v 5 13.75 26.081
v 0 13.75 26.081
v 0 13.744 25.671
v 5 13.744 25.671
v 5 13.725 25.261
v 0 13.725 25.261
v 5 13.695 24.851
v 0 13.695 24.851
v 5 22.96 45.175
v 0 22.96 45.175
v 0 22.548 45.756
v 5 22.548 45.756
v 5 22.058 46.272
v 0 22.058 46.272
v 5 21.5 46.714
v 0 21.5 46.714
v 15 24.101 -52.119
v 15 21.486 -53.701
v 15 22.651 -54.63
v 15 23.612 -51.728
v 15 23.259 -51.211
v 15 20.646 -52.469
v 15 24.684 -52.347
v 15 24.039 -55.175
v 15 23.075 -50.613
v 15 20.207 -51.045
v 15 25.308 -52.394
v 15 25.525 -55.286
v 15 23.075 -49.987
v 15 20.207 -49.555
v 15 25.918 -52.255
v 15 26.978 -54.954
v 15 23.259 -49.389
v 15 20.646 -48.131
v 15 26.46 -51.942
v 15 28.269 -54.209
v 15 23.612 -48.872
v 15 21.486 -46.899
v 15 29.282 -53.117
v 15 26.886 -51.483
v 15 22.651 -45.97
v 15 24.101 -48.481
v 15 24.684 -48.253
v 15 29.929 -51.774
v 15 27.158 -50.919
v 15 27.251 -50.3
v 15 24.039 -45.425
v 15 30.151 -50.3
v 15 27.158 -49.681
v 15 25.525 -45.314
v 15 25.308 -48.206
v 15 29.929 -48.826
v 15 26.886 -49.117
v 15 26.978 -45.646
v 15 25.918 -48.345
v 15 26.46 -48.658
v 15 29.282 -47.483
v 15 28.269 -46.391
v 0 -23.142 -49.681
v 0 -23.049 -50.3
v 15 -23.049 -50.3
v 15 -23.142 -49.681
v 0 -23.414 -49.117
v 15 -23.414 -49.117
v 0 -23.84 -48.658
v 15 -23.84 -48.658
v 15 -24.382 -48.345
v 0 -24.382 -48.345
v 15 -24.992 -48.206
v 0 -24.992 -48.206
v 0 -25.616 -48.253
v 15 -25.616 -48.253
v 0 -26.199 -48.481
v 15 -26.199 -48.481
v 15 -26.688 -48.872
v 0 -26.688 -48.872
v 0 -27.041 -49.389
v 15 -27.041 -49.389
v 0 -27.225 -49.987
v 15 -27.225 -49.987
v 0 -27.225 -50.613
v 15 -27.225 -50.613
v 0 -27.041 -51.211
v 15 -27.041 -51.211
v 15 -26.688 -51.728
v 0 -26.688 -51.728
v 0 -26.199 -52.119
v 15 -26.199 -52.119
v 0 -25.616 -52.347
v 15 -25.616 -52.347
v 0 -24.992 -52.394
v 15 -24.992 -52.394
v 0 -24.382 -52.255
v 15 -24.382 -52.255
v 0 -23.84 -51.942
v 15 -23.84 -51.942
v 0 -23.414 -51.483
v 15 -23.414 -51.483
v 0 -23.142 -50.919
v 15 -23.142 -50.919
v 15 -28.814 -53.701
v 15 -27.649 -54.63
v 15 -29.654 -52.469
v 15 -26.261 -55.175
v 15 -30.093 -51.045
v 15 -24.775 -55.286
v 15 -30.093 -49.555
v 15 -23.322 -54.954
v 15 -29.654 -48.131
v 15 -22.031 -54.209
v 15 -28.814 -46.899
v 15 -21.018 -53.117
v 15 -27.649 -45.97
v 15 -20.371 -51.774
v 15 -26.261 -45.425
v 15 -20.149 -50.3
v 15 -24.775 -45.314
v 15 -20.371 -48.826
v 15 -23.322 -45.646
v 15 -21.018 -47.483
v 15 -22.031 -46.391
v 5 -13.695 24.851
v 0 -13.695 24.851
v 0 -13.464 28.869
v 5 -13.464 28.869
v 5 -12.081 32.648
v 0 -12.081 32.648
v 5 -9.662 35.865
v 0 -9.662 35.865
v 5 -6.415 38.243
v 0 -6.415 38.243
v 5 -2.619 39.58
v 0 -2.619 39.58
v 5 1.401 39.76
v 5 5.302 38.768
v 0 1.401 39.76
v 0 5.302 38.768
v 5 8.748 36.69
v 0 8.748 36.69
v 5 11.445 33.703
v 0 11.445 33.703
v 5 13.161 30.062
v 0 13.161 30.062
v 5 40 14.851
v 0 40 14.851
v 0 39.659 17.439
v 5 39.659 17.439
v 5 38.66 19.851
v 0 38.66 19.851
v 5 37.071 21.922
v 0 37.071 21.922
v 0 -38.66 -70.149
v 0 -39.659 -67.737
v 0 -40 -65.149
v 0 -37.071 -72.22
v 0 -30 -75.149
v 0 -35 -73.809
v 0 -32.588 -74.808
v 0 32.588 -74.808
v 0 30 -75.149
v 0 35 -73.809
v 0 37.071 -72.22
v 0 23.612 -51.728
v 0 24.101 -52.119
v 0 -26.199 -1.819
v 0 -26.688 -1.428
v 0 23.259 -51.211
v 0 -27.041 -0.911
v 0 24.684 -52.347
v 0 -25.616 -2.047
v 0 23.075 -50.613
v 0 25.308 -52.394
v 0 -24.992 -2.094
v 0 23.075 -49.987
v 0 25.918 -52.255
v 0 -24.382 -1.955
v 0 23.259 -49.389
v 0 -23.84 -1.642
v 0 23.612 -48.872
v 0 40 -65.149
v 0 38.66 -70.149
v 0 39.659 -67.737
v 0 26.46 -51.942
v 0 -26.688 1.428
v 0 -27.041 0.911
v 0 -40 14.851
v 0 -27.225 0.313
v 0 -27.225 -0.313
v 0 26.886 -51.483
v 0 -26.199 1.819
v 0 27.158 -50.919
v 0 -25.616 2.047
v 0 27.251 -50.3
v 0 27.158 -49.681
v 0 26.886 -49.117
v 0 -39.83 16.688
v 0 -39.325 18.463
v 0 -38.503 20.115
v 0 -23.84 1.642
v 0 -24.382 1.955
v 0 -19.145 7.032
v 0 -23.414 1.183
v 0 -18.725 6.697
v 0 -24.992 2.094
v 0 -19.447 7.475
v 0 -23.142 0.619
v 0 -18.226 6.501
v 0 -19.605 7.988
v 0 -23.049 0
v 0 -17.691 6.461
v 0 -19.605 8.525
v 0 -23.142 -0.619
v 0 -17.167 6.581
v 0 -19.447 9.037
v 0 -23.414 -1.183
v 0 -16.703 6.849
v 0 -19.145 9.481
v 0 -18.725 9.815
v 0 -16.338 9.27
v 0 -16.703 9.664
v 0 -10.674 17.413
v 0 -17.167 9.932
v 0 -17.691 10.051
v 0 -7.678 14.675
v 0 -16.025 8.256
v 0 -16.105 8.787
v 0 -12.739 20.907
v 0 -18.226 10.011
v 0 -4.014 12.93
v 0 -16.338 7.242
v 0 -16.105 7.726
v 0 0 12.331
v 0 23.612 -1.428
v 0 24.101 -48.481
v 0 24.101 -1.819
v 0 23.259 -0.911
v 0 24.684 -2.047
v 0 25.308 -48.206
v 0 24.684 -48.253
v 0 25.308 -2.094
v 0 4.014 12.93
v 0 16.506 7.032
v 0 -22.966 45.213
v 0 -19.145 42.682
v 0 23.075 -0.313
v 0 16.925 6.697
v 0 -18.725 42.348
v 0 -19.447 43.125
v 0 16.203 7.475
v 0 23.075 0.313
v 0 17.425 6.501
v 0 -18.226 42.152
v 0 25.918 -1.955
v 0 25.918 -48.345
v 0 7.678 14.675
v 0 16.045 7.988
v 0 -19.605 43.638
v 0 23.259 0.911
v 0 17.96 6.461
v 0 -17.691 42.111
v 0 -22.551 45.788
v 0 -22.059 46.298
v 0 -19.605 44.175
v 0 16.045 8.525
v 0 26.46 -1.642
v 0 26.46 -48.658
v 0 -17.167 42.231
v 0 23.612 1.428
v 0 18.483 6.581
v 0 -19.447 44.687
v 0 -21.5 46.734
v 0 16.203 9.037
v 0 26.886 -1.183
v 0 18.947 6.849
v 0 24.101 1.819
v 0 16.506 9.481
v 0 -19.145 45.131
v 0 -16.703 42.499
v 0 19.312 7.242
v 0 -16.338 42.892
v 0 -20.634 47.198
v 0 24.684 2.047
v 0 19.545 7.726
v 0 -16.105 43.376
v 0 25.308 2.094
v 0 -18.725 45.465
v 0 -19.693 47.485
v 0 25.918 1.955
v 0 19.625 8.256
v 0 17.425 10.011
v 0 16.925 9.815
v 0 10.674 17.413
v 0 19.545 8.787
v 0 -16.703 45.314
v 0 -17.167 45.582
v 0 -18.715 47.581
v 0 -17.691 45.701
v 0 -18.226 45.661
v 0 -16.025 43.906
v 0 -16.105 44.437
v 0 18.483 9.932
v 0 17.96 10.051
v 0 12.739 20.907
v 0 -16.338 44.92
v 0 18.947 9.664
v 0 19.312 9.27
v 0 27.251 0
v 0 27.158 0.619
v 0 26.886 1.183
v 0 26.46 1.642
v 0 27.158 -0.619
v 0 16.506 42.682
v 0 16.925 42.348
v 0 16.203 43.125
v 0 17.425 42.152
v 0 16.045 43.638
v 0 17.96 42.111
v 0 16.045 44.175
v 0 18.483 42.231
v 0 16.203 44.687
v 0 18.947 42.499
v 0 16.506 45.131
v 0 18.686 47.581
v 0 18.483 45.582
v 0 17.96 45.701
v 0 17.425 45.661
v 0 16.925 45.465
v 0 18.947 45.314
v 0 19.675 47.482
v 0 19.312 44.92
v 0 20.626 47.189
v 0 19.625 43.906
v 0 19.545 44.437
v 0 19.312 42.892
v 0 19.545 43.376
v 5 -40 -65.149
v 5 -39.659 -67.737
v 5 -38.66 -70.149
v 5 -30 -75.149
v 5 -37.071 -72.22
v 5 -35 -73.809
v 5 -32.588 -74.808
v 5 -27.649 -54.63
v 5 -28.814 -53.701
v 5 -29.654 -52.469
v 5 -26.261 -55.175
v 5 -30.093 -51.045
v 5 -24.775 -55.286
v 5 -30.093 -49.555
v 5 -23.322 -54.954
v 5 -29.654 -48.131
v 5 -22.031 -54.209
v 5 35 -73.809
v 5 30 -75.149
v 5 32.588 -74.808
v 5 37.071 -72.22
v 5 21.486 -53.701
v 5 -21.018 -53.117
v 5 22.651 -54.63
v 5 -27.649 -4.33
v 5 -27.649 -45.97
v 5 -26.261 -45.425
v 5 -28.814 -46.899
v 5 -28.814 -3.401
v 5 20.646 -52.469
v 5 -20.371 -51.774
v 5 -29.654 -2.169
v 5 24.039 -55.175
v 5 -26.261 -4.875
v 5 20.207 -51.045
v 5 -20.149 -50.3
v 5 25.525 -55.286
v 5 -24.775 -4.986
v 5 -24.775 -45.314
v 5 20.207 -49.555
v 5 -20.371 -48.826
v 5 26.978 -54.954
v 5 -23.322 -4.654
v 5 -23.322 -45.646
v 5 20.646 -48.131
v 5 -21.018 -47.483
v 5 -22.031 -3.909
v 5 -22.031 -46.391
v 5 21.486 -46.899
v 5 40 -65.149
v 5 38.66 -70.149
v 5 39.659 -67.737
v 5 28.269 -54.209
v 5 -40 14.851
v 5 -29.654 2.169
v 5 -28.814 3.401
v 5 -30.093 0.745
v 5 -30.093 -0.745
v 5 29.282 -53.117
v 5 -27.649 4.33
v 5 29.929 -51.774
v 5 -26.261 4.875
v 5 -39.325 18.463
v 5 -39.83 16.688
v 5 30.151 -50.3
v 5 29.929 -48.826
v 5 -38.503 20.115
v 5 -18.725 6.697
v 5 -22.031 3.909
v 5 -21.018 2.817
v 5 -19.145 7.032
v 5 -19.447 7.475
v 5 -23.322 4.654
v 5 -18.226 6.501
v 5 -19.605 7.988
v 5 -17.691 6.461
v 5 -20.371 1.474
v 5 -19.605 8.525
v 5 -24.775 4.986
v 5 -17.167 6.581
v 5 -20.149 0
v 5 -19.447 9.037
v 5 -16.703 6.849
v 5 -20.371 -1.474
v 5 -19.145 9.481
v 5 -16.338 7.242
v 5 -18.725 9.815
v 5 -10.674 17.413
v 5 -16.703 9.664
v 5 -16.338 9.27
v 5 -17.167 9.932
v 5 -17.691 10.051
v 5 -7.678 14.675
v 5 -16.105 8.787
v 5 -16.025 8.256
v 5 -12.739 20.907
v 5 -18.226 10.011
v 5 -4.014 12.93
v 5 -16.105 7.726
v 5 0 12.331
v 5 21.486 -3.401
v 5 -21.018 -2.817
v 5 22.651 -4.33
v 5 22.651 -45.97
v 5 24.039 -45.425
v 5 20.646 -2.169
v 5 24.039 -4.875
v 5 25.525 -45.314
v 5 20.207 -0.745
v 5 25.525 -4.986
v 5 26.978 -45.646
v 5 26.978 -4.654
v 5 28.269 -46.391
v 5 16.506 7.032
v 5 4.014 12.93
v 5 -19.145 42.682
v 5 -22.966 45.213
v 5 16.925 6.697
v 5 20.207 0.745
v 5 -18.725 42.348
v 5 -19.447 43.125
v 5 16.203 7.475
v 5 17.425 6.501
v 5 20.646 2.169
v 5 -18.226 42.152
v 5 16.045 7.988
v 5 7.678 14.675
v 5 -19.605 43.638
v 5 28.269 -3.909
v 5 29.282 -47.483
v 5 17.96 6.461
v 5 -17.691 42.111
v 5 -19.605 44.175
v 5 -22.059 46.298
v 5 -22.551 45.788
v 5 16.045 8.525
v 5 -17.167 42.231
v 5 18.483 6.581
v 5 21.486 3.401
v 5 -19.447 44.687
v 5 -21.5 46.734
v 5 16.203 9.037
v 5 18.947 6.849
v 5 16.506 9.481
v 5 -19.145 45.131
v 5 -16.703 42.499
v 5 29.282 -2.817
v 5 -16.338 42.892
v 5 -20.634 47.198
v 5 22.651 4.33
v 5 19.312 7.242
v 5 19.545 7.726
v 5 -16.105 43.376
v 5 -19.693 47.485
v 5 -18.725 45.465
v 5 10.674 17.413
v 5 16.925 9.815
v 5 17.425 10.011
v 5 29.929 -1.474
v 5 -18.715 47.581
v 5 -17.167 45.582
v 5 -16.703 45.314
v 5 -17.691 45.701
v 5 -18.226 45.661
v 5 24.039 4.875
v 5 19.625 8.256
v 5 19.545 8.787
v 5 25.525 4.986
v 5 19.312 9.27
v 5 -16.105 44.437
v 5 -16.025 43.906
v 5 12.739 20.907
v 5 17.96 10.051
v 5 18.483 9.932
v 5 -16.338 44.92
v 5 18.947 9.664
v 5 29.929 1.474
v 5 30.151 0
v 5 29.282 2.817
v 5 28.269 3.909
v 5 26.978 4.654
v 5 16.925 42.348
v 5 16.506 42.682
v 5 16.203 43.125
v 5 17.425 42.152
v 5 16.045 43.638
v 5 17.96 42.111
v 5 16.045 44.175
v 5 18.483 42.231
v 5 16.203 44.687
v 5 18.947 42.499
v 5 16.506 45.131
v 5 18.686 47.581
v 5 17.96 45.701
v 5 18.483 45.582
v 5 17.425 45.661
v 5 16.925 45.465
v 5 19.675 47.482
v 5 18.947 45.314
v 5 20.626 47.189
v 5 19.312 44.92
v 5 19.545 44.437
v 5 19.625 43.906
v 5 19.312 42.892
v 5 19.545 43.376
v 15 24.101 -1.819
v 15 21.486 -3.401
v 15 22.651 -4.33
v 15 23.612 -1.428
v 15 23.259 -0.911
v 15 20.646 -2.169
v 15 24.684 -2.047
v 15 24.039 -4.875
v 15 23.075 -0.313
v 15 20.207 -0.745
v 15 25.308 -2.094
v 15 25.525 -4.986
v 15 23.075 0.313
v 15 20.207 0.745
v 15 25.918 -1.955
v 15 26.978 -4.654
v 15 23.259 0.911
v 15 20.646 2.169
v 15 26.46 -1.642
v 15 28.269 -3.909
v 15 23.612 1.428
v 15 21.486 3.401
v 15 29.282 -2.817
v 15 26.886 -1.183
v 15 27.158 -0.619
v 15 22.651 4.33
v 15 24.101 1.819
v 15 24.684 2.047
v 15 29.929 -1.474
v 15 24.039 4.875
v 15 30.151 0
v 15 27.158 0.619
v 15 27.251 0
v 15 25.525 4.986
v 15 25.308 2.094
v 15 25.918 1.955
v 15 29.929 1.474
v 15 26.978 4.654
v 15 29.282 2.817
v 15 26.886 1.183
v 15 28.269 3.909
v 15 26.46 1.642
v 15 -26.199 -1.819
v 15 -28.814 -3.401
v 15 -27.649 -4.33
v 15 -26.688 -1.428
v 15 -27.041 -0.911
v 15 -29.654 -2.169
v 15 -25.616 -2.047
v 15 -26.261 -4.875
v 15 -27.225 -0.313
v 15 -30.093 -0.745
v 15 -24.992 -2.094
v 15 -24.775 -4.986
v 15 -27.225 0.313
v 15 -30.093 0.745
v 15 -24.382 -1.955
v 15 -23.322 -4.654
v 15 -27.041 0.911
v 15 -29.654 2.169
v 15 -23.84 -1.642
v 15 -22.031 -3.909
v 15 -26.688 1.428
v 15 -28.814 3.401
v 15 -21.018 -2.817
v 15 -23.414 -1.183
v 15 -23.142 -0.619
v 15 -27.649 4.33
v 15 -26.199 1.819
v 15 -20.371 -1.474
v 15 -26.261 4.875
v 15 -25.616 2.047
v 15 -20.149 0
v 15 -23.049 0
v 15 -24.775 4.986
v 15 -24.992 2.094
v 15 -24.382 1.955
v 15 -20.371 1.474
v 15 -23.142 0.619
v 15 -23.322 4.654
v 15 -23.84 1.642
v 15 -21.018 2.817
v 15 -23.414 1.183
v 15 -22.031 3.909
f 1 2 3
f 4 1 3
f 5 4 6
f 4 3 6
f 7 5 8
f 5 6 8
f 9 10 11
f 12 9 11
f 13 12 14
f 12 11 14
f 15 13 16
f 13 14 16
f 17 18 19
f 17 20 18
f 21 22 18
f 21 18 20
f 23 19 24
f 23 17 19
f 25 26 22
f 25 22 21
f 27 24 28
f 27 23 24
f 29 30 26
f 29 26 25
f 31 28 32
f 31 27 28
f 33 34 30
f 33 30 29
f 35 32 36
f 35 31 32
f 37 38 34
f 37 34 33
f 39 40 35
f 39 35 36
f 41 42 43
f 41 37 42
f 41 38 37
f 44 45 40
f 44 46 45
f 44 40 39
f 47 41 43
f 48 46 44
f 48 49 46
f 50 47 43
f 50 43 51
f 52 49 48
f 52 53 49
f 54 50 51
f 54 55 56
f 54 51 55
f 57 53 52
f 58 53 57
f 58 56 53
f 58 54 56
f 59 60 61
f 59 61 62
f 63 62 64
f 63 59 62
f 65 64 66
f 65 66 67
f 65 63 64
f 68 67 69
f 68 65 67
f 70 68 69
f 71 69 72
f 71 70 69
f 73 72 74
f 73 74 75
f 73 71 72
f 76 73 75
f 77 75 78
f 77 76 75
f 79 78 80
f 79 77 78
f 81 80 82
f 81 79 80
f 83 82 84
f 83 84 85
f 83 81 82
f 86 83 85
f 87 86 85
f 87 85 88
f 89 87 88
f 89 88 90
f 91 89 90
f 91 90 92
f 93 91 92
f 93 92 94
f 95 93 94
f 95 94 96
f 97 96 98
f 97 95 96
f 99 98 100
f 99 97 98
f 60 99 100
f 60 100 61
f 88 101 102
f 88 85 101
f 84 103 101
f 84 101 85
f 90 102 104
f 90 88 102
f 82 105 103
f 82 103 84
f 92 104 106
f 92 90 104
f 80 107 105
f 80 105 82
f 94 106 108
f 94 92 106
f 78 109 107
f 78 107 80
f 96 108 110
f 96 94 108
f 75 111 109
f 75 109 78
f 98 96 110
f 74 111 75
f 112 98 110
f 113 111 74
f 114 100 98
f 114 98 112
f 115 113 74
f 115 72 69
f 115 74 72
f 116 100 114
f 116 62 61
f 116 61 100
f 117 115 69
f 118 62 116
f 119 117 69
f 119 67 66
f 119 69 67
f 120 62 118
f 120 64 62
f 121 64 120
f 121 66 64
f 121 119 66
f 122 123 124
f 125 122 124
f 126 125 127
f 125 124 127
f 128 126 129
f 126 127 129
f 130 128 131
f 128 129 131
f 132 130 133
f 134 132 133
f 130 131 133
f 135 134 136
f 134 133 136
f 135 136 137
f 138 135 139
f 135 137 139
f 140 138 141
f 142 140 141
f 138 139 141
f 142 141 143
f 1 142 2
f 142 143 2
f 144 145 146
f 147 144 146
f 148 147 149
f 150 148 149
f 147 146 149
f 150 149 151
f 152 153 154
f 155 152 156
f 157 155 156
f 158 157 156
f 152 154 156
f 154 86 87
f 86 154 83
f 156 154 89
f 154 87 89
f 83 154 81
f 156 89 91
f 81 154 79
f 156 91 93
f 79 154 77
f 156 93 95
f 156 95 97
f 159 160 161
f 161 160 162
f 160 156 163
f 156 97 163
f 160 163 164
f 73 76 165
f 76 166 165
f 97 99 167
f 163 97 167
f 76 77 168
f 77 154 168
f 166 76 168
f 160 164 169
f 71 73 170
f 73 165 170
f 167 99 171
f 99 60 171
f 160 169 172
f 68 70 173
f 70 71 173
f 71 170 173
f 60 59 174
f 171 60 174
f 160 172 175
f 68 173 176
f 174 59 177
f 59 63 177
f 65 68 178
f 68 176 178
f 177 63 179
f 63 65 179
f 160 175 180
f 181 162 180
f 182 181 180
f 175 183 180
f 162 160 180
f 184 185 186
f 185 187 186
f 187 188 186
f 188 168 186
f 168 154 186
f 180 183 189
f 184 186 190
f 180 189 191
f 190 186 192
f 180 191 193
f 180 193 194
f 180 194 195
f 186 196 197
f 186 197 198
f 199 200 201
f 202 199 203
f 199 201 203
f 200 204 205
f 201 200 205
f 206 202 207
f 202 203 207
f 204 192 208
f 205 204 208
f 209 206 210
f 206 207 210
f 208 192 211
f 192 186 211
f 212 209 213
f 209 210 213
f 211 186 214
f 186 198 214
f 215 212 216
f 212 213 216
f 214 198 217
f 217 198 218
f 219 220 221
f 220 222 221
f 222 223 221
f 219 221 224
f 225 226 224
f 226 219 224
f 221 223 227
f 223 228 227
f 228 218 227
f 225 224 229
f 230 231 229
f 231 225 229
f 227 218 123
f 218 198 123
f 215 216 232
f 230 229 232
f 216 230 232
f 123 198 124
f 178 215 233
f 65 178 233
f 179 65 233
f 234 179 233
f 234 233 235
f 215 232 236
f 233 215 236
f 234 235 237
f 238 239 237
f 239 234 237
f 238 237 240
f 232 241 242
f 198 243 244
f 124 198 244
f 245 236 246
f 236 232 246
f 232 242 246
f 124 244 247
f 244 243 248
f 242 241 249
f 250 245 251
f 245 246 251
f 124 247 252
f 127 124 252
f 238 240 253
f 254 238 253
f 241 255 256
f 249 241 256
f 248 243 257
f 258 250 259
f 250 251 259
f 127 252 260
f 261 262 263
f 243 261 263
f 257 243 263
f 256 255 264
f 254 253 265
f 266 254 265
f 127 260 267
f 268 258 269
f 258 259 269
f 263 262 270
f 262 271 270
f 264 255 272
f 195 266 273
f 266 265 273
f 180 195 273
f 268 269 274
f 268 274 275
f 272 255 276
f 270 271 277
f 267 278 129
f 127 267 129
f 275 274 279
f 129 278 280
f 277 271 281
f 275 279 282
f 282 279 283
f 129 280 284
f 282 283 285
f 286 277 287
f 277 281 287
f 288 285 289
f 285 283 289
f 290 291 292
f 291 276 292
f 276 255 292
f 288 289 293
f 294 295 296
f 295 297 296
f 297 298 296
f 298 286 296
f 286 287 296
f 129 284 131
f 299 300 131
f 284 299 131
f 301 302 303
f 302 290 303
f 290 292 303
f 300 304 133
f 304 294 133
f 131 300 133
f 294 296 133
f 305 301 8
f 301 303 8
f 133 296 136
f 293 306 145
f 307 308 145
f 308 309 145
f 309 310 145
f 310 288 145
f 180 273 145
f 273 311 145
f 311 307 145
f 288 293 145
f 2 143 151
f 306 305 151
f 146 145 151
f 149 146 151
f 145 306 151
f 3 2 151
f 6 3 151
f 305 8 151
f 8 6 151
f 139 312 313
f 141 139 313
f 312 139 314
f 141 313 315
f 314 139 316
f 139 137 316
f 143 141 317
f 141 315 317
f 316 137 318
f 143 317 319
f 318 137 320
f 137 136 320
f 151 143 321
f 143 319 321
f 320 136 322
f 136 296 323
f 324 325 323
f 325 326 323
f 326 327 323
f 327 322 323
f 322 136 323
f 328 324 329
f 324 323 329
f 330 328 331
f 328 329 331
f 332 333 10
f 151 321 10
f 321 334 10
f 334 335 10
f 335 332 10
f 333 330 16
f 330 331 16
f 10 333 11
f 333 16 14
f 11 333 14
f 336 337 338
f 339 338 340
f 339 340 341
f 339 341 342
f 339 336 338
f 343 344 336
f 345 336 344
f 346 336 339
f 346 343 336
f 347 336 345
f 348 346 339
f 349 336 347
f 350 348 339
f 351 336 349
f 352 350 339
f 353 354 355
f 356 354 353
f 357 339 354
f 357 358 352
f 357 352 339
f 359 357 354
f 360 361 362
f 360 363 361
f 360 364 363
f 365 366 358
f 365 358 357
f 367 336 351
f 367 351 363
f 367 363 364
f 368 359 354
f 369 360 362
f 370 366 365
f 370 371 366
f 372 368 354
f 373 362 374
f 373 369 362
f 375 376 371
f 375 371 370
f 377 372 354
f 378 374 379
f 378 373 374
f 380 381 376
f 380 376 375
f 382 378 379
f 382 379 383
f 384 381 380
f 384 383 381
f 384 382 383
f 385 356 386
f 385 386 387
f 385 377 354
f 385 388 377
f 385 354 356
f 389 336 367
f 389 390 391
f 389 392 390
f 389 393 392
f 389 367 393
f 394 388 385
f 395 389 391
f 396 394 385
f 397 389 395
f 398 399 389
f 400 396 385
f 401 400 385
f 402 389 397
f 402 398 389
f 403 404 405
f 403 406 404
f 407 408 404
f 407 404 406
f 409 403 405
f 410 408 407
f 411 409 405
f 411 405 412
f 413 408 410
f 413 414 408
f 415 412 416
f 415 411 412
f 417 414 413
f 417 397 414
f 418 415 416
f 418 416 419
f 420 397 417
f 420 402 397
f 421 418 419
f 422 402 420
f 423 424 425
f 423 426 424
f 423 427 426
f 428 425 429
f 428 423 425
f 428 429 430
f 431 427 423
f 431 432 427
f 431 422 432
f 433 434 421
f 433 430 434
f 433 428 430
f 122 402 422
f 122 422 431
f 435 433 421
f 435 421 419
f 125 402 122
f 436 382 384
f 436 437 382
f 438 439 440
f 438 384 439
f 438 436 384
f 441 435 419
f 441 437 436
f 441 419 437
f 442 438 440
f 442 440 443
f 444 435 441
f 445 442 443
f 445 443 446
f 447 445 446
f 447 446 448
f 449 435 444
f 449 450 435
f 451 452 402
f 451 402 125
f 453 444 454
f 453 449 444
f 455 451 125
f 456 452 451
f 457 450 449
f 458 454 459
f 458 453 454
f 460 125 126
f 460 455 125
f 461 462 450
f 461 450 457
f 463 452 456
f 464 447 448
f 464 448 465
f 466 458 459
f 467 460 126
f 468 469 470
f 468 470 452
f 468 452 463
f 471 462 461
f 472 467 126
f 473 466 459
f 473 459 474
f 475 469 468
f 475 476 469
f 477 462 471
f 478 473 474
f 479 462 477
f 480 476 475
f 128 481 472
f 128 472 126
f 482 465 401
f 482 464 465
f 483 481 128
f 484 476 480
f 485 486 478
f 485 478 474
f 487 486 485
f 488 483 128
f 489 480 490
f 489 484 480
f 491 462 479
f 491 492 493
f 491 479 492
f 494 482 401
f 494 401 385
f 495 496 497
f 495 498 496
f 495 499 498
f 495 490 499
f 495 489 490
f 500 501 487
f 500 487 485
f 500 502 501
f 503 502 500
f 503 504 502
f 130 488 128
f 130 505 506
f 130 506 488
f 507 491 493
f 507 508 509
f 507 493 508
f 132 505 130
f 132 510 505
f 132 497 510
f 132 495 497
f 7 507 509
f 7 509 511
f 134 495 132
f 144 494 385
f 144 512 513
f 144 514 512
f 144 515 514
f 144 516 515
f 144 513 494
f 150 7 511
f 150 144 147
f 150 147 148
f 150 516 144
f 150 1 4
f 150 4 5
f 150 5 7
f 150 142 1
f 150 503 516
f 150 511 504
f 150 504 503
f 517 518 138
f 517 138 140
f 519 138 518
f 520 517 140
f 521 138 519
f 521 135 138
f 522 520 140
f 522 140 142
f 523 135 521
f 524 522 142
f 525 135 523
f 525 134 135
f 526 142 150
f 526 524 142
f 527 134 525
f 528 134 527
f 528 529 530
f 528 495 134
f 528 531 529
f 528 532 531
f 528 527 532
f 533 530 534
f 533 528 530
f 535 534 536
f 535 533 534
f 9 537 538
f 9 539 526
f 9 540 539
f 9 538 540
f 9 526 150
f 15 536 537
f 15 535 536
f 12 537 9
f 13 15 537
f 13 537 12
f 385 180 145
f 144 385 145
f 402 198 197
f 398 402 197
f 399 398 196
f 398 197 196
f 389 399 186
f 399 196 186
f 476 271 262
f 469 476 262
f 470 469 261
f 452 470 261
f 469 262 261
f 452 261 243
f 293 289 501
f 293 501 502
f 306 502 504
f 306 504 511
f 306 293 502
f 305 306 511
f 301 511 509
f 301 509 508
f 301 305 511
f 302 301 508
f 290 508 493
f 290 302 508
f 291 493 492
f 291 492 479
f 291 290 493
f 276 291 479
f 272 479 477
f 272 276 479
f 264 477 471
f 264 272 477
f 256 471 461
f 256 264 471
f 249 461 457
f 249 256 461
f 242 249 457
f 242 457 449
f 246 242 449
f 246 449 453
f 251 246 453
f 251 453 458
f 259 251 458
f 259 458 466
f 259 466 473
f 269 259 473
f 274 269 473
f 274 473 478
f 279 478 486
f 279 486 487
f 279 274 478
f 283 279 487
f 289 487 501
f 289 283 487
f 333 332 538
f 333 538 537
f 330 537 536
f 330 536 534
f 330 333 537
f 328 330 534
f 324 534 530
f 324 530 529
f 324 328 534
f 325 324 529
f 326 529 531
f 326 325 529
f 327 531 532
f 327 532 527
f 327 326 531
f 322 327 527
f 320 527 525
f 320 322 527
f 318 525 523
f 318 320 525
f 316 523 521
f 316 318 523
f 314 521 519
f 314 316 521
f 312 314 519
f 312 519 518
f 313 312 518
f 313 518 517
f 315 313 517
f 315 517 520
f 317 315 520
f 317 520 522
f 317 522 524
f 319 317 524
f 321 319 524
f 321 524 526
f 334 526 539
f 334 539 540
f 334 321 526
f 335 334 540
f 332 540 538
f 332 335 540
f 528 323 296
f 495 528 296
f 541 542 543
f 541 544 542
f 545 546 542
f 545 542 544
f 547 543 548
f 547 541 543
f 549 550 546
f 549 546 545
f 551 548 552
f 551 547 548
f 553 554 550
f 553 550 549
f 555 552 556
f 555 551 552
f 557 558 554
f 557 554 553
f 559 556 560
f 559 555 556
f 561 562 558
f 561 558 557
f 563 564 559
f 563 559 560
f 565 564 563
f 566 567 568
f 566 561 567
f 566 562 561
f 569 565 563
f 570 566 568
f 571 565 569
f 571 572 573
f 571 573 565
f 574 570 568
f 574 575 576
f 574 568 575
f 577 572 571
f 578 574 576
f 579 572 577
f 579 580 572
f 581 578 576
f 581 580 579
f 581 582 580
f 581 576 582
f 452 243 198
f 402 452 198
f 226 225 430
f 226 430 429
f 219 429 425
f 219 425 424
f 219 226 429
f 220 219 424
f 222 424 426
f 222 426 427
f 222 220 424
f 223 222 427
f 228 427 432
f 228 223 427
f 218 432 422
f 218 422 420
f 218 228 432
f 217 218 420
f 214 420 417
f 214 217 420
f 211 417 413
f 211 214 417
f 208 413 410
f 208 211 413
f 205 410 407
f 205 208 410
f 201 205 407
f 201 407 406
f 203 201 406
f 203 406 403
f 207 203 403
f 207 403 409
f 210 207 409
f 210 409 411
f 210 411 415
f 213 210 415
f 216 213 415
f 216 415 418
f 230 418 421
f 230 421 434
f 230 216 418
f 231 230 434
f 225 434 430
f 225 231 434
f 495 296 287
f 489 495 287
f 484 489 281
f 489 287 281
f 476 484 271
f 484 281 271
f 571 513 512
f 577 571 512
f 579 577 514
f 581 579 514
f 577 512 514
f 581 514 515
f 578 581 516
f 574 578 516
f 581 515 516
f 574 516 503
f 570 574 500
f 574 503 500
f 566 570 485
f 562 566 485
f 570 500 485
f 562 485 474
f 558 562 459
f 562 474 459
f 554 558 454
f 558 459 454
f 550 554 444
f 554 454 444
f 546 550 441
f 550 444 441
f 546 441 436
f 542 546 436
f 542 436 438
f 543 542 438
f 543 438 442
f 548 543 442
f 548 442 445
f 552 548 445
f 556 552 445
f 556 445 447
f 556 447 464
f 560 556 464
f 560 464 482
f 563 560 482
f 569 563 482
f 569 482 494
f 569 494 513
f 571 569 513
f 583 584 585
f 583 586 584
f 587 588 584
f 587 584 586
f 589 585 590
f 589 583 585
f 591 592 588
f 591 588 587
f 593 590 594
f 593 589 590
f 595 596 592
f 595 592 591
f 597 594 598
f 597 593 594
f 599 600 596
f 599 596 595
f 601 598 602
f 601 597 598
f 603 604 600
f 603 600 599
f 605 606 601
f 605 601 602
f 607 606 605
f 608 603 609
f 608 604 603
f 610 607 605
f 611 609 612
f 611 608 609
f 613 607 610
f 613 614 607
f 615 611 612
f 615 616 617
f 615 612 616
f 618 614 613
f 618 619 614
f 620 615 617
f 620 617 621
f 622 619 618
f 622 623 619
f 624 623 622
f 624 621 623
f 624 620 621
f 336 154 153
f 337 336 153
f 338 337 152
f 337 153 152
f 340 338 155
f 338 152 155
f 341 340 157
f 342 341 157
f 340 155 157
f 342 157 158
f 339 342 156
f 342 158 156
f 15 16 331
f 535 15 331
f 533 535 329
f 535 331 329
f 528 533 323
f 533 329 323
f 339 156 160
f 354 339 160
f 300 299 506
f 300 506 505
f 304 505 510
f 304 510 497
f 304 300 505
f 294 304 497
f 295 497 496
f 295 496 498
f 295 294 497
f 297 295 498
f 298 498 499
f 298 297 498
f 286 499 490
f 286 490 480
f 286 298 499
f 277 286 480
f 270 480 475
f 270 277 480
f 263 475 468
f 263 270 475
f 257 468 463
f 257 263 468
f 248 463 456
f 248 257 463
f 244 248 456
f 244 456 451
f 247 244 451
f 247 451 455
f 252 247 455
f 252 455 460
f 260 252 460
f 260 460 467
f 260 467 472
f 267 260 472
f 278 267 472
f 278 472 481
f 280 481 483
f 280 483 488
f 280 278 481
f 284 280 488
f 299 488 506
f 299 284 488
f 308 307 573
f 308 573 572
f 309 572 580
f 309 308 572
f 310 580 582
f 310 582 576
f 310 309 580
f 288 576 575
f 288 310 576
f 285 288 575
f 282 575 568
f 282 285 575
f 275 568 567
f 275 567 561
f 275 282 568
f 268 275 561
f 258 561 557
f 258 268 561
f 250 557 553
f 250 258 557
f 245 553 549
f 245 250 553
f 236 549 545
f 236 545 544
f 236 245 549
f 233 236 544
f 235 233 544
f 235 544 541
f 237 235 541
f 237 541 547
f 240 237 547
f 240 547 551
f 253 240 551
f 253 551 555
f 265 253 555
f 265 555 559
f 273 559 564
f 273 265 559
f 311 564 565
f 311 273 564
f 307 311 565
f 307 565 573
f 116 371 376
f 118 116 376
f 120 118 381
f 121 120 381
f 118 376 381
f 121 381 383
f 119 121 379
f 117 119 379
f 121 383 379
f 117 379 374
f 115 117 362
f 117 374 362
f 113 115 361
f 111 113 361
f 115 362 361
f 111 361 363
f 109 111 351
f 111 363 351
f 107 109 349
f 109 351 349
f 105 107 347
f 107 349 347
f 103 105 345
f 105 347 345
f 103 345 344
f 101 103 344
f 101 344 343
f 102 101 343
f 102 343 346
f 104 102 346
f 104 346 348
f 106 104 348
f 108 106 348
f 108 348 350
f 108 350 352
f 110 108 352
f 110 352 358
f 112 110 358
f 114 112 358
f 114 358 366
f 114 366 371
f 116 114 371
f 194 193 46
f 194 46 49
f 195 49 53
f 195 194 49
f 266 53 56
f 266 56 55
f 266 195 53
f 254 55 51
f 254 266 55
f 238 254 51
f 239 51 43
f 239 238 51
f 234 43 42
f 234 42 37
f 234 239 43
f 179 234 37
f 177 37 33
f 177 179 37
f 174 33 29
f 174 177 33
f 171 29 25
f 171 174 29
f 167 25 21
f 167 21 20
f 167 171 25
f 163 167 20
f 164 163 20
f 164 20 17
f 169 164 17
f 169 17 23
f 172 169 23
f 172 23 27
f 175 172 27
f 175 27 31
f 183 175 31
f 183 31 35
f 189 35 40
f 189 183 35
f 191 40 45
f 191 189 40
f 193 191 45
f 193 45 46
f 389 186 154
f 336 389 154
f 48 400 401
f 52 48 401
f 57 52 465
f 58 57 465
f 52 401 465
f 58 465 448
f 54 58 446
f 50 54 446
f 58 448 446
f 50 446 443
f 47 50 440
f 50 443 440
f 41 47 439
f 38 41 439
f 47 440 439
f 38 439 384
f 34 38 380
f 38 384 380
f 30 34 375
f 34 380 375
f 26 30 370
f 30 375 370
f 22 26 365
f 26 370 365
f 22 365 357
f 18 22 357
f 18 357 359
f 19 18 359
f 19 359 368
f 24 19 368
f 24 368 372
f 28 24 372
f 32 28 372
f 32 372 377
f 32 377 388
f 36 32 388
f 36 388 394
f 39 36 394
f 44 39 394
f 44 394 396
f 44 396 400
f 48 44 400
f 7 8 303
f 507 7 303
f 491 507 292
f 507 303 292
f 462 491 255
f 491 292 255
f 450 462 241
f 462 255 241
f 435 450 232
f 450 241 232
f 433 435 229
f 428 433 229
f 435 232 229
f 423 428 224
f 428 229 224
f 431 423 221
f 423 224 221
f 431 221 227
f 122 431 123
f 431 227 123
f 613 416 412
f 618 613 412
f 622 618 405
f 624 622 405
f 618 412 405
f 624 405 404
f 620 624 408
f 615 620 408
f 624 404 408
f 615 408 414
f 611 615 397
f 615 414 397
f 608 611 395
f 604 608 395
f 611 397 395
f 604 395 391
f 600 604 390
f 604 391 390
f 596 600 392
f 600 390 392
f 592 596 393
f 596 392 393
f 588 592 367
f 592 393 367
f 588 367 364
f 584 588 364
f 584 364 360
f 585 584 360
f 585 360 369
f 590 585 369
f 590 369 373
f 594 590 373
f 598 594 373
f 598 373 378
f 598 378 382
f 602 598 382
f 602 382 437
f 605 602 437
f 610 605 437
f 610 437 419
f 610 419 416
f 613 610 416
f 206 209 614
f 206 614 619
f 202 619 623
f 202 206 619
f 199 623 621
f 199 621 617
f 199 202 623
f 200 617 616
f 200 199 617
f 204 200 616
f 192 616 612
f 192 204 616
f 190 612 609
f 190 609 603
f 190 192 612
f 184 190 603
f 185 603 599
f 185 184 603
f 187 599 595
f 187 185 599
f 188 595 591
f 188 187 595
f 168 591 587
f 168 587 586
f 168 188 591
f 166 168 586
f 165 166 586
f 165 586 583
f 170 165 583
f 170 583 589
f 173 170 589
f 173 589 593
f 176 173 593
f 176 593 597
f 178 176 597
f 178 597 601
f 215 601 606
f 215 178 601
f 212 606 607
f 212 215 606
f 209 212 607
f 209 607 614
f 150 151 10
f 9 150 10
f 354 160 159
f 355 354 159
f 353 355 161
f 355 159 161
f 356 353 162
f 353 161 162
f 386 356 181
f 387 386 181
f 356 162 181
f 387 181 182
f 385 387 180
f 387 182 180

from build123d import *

# Parameters (mm, degrees)
F0_R     = 5
F0_R_2   = 1.8
F1_DEPTH = 5
F0_R_3   = 2.1
F2_DEPTH = 15


with BuildPart() as f1:
    # F0 (on Right) → F1 (new body)
    with BuildSketch(Plane.YZ):
        with BuildLine():
            Line((-30, -75.14885), (30, -75.14885))
            ThreePointArc((30, -75.14885), (37.071068, -72.219918), (40, -65.14885))
            Line((40, -65.14885), (40, 14.85115))
            ThreePointArc((40, 14.85115), (39.238795, 18.677984), (37.071068, 21.922218))
            ThreePointArc((37.071068, 21.922218), (33.826834, 24.089945), (30, 24.85115))
            Line((30, 24.85115), (21.5, 24.85115))
            Line((21.5, 24.85115), (21.5, 4.58134))
            Line((21.5, 4.58134), (-21.5, 4.58134))
            Line((-21.5, 4.58134), (-21.5, 24.85115))
            Line((-21.5, 24.85115), (-30, 24.85115))
            ThreePointArc((-30, 24.85115), (-34.866502, 23.587119), (-38.502722, 20.114582))
            ThreePointArc((-38.502722, 20.114582), (-39.6184, 17.587277), (-40, 14.85115))
            Line((-40, 14.85115), (-40, -65.14885))
            ThreePointArc((-40, -65.14885), (-37.071068, -72.219918), (-30, -75.14885))
        make_face()
        with Locations((-25.14885, -50.3)):
            Circle(F0_R, mode=Mode.SUBTRACT)
        with Locations((25.15115, -50.3)):
            Circle(F0_R, mode=Mode.SUBTRACT)
        with Locations((-25.14885, 0)):
            Circle(F0_R, mode=Mode.SUBTRACT)
        with Locations((25.15115, 0)):
            Circle(F0_R, mode=Mode.SUBTRACT)
        with BuildLine():
            ThreePointArc((30, 24.85115), (33.826834, 24.089945), (37.071068, 21.922218))
            Line((37.071068, 21.922218), (22.960092, 45.175296))
            ThreePointArc((22.960092, 45.175296), (22.312585, 46.022981), (21.5, 46.714025))
            Line((21.5, 46.714025), (21.5, 24.85115))
            Line((21.5, 24.85115), (30, 24.85115))
        make_face()
        with BuildLine():
            Line((-22.966037, 45.213056), (-38.502722, 20.114582))
            ThreePointArc((-38.502722, 20.114582), (-34.866502, 23.587119), (-30, 24.85115))
            Line((-30, 24.85115), (-21.5, 24.85115))
            Line((-21.5, 24.85115), (-21.5, 46.733685))
            ThreePointArc((-21.5, 46.733685), (-22.314233, 46.05167), (-22.966037, 45.213056))
        make_face()
        with BuildLine():
            Line((13.694858, 24.85115), (21.5, 24.85115))
            Line((21.5, 24.85115), (21.5, 46.714025))
            ThreePointArc((21.5, 46.714025), (20.158098, 47.359594), (18.685587, 47.58134))
            Line((18.685587, 47.58134), (-18.714676, 47.58134))
            ThreePointArc((-18.714676, 47.58134), (-20.170401, 47.364735), (-21.5, 46.733685))
            Line((-21.5, 46.733685), (-21.5, 24.85115))
            Line((-21.5, 24.85115), (-13.694858, 24.85115))
            ThreePointArc((-13.694858, 24.85115), (-0.615713, 39.817548), (13.75, 26.08134))
            ThreePointArc((13.75, 26.08134), (13.736208, 25.465628), (13.694858, 24.85115))
        make_face()
        with Locations((-17.825069, 43.906409)):
            Circle(F0_R_2, mode=Mode.SUBTRACT)
        with Locations((17.825069, 43.906409)):
            Circle(F0_R_2, mode=Mode.SUBTRACT)
        with BuildLine():
            Line((21.5, 4.58134), (21.5, 24.85115))
            Line((21.5, 24.85115), (13.694858, 24.85115))
            ThreePointArc((13.694858, 24.85115), (0, 12.33134), (-13.694858, 24.85115))
            Line((-13.694858, 24.85115), (-21.5, 24.85115))
            Line((-21.5, 24.85115), (-21.5, 4.58134))
            Line((-21.5, 4.58134), (21.5, 4.58134))
        make_face()
        with Locations((-17.825069, 8.256271)):
            Circle(F0_R_2, mode=Mode.SUBTRACT)
        with Locations((17.825069, 8.256271)):
            Circle(F0_R_2, mode=Mode.SUBTRACT)
    extrude(amount=F1_DEPTH)

    # F0 (on Right) → F2 (join)
    with BuildSketch(Plane.YZ):
        with Locations((-25.14885, 0)):
            Circle(F0_R)
        with Locations((-25.14885, 0)):
            Circle(F0_R_3, mode=Mode.SUBTRACT)
        with Locations((25.15115, 0)):
            Circle(F0_R)
        with Locations((25.15115, 0)):
            Circle(F0_R_3, mode=Mode.SUBTRACT)
        with Locations((25.15115, -50.3)):
            Circle(F0_R)
        with Locations((25.15115, -50.3)):
            Circle(F0_R_3, mode=Mode.SUBTRACT)
        with Locations((-25.14885, -50.3)):
            Circle(F0_R)
        with Locations((-25.14885, -50.3)):
            Circle(F0_R_3, mode=Mode.SUBTRACT)
    extrude(amount=F2_DEPTH)


solid = f1.part
